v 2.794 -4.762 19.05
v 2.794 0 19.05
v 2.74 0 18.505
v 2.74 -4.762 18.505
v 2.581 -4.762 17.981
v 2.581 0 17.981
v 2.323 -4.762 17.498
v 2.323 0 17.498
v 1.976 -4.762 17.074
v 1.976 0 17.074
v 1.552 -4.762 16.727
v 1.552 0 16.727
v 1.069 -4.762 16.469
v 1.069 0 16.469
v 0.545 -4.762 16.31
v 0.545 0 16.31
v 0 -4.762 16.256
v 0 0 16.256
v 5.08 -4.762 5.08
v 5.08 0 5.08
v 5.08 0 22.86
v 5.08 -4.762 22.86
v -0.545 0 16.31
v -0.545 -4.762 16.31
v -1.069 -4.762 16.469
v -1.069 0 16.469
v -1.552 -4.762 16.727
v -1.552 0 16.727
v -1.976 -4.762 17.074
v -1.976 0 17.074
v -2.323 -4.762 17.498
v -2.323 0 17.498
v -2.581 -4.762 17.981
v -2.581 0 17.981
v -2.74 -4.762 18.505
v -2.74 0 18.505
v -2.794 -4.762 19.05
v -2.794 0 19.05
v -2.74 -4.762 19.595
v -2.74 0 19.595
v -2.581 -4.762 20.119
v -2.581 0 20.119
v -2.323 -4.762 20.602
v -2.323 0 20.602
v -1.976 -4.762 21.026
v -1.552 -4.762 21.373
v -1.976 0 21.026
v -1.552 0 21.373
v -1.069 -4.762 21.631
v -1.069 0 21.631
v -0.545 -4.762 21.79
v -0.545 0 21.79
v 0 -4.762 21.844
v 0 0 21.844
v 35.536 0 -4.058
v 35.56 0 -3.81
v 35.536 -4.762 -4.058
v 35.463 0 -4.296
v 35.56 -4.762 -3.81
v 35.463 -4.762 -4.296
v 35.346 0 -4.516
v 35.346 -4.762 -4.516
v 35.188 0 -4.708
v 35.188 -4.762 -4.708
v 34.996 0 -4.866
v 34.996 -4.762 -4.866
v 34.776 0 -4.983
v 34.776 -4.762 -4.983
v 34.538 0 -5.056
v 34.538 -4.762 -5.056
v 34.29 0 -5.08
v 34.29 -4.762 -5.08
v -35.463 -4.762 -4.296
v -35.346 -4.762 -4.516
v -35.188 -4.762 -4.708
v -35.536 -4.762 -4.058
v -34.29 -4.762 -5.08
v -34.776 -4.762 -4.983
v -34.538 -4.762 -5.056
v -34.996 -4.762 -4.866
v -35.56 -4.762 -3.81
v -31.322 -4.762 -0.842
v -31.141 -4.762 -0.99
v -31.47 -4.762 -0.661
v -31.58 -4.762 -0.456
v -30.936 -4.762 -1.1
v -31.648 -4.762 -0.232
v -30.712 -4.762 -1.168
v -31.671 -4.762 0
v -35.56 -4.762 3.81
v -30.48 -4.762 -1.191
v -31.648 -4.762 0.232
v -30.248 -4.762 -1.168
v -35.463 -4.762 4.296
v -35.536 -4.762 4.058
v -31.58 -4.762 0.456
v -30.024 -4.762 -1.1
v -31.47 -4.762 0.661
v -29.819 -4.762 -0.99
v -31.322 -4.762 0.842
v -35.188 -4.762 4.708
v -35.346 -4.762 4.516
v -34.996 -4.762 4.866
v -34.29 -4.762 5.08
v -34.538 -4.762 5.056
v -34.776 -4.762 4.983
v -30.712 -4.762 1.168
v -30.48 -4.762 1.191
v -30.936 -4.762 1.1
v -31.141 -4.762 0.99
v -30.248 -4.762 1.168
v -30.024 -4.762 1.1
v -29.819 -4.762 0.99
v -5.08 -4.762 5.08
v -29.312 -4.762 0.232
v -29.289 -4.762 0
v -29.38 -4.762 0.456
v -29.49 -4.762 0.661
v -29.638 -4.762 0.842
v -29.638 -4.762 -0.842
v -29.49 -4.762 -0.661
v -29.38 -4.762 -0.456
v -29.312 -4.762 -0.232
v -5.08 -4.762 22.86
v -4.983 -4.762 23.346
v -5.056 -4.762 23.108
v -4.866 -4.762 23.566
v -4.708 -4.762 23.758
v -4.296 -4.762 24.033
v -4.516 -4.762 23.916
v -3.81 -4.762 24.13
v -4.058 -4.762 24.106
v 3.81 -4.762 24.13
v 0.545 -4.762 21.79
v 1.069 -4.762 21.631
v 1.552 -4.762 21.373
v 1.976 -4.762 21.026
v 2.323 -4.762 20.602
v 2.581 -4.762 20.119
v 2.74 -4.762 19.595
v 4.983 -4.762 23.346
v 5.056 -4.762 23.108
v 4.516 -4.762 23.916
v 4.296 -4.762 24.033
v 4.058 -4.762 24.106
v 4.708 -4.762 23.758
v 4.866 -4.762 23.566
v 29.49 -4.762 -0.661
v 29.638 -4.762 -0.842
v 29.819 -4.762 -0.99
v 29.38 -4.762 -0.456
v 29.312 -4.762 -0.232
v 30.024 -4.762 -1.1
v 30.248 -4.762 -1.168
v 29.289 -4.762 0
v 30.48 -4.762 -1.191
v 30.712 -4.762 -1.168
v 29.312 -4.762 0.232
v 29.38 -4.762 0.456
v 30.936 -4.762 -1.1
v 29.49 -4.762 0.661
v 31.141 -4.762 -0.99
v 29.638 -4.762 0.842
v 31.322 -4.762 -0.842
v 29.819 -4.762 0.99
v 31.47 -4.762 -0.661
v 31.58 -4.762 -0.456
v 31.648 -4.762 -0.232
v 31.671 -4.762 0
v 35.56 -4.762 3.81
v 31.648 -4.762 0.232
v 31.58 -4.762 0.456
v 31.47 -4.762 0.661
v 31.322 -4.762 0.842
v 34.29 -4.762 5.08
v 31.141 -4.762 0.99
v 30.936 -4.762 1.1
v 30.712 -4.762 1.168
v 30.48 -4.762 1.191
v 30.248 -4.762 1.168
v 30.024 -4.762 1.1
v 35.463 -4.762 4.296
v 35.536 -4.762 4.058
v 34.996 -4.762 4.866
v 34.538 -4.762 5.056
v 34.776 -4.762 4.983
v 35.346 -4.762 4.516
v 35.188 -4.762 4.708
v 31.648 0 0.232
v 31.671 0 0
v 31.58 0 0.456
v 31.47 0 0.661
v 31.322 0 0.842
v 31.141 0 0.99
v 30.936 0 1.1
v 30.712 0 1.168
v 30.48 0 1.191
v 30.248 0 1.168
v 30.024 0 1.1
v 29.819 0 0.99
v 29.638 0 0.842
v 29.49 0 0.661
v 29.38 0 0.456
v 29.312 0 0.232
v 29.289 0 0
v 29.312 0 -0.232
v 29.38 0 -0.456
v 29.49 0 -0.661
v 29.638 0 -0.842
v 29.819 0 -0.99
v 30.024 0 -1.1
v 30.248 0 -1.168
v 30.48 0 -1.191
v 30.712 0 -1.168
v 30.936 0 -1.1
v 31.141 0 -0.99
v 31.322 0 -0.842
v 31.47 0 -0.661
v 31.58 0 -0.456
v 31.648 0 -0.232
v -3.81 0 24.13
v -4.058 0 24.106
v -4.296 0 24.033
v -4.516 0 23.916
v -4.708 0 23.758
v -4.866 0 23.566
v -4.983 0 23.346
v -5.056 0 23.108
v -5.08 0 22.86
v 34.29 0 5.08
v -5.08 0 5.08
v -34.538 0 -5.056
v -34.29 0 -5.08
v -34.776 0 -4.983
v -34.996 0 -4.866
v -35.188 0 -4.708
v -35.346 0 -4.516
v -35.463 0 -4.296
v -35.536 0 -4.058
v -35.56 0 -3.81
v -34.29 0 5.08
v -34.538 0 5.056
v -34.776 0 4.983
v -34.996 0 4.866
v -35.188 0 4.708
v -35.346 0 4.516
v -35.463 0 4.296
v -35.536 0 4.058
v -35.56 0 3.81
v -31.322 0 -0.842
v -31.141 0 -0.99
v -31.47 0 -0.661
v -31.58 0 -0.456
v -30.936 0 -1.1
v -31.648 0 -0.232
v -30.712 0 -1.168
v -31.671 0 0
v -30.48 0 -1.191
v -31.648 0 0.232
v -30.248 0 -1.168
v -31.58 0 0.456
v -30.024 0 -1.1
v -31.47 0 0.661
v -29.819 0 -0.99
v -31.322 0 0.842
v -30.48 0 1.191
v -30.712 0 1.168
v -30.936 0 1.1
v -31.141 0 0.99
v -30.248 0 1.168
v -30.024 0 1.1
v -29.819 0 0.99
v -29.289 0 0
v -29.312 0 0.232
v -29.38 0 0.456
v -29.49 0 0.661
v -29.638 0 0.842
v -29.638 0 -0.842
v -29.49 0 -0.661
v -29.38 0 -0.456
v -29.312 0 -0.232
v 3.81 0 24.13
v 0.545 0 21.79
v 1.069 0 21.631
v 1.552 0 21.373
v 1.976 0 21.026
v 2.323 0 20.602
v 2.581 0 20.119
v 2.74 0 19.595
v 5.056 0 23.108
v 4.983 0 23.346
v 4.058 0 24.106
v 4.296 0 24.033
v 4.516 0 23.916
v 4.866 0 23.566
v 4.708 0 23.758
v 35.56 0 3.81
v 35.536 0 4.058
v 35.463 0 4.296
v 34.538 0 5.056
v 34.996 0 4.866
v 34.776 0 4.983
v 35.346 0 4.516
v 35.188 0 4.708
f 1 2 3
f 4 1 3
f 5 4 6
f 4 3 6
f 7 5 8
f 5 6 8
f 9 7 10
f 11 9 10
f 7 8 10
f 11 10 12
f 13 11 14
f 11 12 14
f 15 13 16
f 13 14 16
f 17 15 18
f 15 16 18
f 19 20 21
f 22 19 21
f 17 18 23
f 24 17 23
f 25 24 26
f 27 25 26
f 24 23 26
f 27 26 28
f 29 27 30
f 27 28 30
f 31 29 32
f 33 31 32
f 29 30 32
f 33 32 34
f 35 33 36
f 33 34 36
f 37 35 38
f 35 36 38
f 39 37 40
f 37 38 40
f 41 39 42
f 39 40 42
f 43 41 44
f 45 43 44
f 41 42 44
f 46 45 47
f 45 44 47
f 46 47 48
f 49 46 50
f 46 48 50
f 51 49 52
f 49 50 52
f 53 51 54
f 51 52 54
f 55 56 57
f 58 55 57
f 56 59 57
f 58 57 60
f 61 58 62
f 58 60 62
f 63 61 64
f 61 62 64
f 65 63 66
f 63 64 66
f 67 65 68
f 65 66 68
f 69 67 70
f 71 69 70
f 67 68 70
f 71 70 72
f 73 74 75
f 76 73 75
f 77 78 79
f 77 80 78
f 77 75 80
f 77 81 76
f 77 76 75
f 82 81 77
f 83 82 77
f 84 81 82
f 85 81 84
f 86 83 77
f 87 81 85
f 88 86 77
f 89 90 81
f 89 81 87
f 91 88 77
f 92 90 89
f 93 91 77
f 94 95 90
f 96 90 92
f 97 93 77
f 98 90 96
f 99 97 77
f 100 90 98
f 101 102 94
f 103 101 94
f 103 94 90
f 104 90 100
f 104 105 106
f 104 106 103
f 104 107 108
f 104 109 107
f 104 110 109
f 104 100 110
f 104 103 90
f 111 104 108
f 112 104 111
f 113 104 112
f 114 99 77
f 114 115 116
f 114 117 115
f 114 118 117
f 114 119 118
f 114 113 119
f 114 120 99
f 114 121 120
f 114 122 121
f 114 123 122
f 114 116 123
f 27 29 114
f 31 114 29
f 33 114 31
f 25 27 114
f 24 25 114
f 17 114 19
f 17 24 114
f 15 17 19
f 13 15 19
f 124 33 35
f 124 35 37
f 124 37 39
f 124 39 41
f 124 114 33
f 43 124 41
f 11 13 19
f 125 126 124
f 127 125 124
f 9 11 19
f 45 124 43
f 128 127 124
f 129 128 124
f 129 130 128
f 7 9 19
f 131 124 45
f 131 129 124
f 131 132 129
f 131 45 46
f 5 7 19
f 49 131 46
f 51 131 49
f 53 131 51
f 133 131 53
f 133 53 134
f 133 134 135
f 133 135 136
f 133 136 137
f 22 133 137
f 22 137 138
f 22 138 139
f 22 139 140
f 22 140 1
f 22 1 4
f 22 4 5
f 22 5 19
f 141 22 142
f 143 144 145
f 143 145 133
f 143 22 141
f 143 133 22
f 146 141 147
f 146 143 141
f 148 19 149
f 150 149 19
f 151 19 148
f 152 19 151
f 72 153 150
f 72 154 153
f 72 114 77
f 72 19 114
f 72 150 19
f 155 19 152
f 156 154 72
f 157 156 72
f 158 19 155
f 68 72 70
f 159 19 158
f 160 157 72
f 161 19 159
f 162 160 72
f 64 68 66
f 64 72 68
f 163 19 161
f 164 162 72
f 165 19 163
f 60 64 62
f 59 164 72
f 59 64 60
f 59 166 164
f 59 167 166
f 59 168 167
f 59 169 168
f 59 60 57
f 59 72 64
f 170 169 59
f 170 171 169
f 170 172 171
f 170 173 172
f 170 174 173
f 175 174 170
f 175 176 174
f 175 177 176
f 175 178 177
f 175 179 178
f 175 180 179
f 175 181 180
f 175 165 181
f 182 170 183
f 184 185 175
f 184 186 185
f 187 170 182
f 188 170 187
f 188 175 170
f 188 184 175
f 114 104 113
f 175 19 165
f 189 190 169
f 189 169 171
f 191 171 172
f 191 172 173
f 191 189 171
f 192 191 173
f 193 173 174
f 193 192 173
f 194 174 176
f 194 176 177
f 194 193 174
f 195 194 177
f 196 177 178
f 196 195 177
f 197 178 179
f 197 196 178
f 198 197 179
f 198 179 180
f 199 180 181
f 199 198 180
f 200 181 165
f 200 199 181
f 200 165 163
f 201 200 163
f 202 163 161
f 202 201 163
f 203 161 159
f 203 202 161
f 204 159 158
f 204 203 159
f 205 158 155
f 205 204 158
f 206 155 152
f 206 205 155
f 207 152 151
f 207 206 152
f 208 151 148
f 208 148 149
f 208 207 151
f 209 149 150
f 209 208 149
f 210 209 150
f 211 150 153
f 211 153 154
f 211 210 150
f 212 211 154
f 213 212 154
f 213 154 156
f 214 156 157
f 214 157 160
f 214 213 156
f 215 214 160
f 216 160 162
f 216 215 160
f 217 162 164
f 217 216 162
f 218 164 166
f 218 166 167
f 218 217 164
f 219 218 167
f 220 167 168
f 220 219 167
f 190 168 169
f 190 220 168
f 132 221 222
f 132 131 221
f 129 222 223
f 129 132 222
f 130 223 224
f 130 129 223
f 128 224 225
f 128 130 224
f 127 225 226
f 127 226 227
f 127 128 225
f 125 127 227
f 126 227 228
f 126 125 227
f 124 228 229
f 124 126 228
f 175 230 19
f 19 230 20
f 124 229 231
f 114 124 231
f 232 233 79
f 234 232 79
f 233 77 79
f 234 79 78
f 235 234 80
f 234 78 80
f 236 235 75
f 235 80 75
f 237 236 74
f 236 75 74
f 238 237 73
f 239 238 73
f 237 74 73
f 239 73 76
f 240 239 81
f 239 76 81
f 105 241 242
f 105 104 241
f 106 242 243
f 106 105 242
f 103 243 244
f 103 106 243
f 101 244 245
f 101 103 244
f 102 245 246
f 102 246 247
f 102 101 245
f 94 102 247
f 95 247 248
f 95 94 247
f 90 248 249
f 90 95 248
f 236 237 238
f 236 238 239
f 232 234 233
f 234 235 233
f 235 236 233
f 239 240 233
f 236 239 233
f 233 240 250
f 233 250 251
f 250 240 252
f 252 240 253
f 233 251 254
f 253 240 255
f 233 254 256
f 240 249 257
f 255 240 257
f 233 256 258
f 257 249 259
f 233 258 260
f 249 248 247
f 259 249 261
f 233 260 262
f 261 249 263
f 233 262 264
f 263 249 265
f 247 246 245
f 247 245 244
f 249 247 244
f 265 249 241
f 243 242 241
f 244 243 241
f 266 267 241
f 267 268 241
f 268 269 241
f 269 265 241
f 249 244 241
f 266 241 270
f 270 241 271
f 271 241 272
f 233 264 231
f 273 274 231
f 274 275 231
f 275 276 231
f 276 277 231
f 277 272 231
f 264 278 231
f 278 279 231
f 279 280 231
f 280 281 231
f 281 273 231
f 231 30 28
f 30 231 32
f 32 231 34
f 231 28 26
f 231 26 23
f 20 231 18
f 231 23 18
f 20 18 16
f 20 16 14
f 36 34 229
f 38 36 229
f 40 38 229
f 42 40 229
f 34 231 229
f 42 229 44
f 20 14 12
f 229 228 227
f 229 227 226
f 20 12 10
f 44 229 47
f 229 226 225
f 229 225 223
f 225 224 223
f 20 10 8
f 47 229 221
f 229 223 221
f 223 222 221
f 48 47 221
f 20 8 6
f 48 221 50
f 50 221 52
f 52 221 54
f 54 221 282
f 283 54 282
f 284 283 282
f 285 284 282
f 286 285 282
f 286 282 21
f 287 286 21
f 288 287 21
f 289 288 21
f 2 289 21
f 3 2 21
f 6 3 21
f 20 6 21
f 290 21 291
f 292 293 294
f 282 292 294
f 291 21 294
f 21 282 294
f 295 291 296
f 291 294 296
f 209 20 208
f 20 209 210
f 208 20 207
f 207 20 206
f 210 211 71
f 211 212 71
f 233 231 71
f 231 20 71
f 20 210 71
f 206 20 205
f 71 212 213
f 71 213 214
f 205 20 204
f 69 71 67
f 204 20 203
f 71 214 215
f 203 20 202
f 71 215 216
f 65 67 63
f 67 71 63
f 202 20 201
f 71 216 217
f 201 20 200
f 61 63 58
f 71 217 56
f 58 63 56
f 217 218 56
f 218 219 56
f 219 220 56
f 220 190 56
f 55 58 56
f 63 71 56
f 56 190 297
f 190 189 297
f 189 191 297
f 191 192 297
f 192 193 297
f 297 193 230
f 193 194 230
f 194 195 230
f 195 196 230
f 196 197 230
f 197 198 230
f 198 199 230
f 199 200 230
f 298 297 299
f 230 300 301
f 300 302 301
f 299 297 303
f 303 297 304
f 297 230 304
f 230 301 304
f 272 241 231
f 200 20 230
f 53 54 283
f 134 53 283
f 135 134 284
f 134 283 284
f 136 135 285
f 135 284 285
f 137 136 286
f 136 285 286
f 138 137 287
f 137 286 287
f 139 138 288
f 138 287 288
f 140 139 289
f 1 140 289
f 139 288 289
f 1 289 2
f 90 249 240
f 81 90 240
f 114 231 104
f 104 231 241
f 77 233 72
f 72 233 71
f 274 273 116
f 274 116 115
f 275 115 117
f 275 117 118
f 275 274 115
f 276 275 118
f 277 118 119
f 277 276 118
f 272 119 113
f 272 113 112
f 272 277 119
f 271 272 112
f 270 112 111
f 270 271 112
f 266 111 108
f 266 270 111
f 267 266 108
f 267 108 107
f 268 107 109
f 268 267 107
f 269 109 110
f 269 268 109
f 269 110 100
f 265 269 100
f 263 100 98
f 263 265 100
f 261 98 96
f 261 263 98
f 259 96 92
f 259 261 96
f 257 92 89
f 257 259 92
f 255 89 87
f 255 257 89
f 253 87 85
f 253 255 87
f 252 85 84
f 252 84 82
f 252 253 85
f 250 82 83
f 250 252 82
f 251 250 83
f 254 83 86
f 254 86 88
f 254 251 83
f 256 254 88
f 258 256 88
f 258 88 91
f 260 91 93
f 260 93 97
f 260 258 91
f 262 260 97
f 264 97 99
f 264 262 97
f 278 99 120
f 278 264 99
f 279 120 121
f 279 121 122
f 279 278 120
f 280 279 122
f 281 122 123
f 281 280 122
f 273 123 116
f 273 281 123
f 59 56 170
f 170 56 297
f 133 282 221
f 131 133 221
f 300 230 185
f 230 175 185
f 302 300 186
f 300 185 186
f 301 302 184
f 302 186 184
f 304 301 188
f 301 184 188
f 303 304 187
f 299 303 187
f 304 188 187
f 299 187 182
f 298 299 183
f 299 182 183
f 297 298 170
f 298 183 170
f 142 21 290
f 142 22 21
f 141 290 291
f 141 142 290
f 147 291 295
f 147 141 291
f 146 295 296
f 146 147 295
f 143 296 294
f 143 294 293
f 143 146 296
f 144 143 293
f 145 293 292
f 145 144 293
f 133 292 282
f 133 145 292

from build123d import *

# Parameters (mm, degrees)
F0_R     = 1.190625
F1_DEPTH = 4.7625
F2_R     = 1.27


# Not quite as in the source:
# - a feature names something its author has since deleted; it is built from what else it names


with BuildPart() as f1:
    # F0 (on Front) → F1 (new body)
    with BuildSketch(Plane.XZ):
        with BuildLine():
            Line((0, 5.08), (5.08, 5.08))
            Line((5.08, 5.08), (5.08, 14.605))
            Line((5.08, 14.605), (5.08, 24.13))
            Line((5.08, 24.13), (0, 24.13))
            Line((0, 24.13), (0, 21.844))
            ThreePointArc((0, 21.844), (1.9756563466, 21.0256563466), (2.794, 19.05))
            ThreePointArc((2.794, 19.05), (1.9756563466, 17.0743436534), (0, 16.256))
            Line((0, 16.256), (0, 5.08))
        make_face()
        with BuildLine():
            Line((-5.08, 5.08), (0, 5.08))
            Line((0, 5.08), (0, 16.256))
            ThreePointArc((0, 16.256), (-2.794, 19.05), (0, 21.844))
            Line((0, 21.844), (0, 24.13))
            Line((0, 24.13), (-5.08, 24.13))
            Line((-5.08, 24.13), (-5.08, 5.08))
        make_face()
        Polygon((35.56, -5.08), (35.56, 5.08), (5.08, 5.08), (0, 5.08), (-5.08, 5.08), (-35.56, 5.08), (-35.56, -5.08), align=None)
        with Locations((-30.48, 0)):
            Circle(F0_R, mode=Mode.SUBTRACT)
        with Locations((30.48, 0)):
            Circle(F0_R, mode=Mode.SUBTRACT)
    extrude(amount=F1_DEPTH)

    # F2
    f2_edges = [f1.edges().sort_by_distance(p)[0] for p in [
        (-5.08, -2.38125, 24.13),
        (5.08, -2.38125, 24.13),
        (35.56, -2.38125, 5.08),
        (35.56, -2.38125, -5.08),
        (-35.56, -2.38125, -5.08),
        (-35.56, -2.38125, 5.08),
    ]]
    fillet(f2_edges, radius=F2_R)


solid = f1.part
